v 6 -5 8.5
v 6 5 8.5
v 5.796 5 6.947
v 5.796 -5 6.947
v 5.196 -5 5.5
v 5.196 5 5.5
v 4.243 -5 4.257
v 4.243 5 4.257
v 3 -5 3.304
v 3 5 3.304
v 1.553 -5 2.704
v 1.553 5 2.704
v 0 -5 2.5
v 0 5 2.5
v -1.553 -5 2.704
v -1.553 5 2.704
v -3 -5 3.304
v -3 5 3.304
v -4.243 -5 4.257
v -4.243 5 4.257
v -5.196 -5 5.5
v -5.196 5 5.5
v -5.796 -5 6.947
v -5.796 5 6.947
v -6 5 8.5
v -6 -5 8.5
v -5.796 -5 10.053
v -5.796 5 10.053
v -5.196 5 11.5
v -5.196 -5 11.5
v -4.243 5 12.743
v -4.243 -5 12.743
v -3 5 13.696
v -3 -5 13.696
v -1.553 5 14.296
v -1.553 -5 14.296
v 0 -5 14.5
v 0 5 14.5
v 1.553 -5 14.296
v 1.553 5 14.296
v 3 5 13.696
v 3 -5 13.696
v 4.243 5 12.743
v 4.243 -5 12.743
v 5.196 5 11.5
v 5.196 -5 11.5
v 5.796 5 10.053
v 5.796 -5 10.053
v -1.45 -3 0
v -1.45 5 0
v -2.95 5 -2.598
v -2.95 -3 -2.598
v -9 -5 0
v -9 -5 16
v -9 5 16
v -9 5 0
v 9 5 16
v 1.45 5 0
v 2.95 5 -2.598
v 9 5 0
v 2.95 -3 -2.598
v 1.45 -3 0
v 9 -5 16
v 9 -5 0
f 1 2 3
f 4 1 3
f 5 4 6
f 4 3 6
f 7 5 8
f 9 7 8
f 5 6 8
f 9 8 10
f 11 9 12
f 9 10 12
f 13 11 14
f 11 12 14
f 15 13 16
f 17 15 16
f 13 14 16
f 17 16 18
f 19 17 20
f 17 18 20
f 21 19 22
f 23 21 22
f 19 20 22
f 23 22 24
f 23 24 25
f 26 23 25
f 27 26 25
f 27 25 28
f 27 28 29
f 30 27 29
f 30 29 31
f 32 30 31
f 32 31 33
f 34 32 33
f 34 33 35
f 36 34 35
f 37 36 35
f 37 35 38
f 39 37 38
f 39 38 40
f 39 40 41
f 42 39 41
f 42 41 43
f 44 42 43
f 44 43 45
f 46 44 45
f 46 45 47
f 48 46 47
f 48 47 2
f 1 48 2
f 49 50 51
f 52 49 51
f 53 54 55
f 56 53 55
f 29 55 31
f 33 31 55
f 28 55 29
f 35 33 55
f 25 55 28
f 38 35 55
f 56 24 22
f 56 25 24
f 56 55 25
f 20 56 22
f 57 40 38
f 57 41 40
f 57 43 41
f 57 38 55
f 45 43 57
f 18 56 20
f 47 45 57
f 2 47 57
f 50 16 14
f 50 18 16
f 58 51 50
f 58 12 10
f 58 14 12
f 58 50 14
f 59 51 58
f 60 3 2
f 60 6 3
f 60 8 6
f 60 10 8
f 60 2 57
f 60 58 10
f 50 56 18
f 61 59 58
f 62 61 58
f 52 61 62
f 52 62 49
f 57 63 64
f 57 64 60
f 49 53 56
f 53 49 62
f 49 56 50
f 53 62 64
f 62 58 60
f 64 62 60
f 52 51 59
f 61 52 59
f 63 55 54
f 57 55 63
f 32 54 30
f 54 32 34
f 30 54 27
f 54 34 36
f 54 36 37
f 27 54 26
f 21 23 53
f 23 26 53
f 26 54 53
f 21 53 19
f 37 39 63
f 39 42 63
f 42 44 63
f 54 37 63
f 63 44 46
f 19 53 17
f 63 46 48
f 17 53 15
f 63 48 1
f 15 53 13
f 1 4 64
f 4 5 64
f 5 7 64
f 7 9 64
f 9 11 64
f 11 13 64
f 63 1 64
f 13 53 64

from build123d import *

# Parameters (mm, degrees)
SKETCH1_W           = 18
SKETCH1_H           = 10
BOSS_EXTRUDE1_DEPTH = 16
SKETCH6_R           = 6
CUT_EXTRUDE1_DEPTH  = 11
BOSS_EXTRUDE2_DEPTH = 8


with BuildPart() as part:
    # Sketch1 → Boss-Extrude1 (new body)
    with BuildSketch(Plane.XY):
        Rectangle(SKETCH1_W, SKETCH1_H)
    extrude(amount=BOSS_EXTRUDE1_DEPTH)

    # Sketch6 → Cut-Extrude1 (cut, through all)
    with BuildSketch(Plane(origin=(0, 5, 0), x_dir=(1, 0, 0), z_dir=(0, 1, 0))):
        with Locations((0, -8.5)):
            Circle(SKETCH6_R)
    extrude(amount=-CUT_EXTRUDE1_DEPTH, mode=Mode.SUBTRACT)

    # Sketch8 → Boss-Extrude2 (add)
    with BuildSketch(Plane(origin=(0, 5, 0), x_dir=(1, 0, 0), z_dir=(0, 1, 0))):
        Polygon((-1.45, 0), (-2.95, 2.598076211), (2.95, 2.598076211), (1.45, 0), align=None)
    extrude(amount=-BOSS_EXTRUDE2_DEPTH)


solid = part.part
